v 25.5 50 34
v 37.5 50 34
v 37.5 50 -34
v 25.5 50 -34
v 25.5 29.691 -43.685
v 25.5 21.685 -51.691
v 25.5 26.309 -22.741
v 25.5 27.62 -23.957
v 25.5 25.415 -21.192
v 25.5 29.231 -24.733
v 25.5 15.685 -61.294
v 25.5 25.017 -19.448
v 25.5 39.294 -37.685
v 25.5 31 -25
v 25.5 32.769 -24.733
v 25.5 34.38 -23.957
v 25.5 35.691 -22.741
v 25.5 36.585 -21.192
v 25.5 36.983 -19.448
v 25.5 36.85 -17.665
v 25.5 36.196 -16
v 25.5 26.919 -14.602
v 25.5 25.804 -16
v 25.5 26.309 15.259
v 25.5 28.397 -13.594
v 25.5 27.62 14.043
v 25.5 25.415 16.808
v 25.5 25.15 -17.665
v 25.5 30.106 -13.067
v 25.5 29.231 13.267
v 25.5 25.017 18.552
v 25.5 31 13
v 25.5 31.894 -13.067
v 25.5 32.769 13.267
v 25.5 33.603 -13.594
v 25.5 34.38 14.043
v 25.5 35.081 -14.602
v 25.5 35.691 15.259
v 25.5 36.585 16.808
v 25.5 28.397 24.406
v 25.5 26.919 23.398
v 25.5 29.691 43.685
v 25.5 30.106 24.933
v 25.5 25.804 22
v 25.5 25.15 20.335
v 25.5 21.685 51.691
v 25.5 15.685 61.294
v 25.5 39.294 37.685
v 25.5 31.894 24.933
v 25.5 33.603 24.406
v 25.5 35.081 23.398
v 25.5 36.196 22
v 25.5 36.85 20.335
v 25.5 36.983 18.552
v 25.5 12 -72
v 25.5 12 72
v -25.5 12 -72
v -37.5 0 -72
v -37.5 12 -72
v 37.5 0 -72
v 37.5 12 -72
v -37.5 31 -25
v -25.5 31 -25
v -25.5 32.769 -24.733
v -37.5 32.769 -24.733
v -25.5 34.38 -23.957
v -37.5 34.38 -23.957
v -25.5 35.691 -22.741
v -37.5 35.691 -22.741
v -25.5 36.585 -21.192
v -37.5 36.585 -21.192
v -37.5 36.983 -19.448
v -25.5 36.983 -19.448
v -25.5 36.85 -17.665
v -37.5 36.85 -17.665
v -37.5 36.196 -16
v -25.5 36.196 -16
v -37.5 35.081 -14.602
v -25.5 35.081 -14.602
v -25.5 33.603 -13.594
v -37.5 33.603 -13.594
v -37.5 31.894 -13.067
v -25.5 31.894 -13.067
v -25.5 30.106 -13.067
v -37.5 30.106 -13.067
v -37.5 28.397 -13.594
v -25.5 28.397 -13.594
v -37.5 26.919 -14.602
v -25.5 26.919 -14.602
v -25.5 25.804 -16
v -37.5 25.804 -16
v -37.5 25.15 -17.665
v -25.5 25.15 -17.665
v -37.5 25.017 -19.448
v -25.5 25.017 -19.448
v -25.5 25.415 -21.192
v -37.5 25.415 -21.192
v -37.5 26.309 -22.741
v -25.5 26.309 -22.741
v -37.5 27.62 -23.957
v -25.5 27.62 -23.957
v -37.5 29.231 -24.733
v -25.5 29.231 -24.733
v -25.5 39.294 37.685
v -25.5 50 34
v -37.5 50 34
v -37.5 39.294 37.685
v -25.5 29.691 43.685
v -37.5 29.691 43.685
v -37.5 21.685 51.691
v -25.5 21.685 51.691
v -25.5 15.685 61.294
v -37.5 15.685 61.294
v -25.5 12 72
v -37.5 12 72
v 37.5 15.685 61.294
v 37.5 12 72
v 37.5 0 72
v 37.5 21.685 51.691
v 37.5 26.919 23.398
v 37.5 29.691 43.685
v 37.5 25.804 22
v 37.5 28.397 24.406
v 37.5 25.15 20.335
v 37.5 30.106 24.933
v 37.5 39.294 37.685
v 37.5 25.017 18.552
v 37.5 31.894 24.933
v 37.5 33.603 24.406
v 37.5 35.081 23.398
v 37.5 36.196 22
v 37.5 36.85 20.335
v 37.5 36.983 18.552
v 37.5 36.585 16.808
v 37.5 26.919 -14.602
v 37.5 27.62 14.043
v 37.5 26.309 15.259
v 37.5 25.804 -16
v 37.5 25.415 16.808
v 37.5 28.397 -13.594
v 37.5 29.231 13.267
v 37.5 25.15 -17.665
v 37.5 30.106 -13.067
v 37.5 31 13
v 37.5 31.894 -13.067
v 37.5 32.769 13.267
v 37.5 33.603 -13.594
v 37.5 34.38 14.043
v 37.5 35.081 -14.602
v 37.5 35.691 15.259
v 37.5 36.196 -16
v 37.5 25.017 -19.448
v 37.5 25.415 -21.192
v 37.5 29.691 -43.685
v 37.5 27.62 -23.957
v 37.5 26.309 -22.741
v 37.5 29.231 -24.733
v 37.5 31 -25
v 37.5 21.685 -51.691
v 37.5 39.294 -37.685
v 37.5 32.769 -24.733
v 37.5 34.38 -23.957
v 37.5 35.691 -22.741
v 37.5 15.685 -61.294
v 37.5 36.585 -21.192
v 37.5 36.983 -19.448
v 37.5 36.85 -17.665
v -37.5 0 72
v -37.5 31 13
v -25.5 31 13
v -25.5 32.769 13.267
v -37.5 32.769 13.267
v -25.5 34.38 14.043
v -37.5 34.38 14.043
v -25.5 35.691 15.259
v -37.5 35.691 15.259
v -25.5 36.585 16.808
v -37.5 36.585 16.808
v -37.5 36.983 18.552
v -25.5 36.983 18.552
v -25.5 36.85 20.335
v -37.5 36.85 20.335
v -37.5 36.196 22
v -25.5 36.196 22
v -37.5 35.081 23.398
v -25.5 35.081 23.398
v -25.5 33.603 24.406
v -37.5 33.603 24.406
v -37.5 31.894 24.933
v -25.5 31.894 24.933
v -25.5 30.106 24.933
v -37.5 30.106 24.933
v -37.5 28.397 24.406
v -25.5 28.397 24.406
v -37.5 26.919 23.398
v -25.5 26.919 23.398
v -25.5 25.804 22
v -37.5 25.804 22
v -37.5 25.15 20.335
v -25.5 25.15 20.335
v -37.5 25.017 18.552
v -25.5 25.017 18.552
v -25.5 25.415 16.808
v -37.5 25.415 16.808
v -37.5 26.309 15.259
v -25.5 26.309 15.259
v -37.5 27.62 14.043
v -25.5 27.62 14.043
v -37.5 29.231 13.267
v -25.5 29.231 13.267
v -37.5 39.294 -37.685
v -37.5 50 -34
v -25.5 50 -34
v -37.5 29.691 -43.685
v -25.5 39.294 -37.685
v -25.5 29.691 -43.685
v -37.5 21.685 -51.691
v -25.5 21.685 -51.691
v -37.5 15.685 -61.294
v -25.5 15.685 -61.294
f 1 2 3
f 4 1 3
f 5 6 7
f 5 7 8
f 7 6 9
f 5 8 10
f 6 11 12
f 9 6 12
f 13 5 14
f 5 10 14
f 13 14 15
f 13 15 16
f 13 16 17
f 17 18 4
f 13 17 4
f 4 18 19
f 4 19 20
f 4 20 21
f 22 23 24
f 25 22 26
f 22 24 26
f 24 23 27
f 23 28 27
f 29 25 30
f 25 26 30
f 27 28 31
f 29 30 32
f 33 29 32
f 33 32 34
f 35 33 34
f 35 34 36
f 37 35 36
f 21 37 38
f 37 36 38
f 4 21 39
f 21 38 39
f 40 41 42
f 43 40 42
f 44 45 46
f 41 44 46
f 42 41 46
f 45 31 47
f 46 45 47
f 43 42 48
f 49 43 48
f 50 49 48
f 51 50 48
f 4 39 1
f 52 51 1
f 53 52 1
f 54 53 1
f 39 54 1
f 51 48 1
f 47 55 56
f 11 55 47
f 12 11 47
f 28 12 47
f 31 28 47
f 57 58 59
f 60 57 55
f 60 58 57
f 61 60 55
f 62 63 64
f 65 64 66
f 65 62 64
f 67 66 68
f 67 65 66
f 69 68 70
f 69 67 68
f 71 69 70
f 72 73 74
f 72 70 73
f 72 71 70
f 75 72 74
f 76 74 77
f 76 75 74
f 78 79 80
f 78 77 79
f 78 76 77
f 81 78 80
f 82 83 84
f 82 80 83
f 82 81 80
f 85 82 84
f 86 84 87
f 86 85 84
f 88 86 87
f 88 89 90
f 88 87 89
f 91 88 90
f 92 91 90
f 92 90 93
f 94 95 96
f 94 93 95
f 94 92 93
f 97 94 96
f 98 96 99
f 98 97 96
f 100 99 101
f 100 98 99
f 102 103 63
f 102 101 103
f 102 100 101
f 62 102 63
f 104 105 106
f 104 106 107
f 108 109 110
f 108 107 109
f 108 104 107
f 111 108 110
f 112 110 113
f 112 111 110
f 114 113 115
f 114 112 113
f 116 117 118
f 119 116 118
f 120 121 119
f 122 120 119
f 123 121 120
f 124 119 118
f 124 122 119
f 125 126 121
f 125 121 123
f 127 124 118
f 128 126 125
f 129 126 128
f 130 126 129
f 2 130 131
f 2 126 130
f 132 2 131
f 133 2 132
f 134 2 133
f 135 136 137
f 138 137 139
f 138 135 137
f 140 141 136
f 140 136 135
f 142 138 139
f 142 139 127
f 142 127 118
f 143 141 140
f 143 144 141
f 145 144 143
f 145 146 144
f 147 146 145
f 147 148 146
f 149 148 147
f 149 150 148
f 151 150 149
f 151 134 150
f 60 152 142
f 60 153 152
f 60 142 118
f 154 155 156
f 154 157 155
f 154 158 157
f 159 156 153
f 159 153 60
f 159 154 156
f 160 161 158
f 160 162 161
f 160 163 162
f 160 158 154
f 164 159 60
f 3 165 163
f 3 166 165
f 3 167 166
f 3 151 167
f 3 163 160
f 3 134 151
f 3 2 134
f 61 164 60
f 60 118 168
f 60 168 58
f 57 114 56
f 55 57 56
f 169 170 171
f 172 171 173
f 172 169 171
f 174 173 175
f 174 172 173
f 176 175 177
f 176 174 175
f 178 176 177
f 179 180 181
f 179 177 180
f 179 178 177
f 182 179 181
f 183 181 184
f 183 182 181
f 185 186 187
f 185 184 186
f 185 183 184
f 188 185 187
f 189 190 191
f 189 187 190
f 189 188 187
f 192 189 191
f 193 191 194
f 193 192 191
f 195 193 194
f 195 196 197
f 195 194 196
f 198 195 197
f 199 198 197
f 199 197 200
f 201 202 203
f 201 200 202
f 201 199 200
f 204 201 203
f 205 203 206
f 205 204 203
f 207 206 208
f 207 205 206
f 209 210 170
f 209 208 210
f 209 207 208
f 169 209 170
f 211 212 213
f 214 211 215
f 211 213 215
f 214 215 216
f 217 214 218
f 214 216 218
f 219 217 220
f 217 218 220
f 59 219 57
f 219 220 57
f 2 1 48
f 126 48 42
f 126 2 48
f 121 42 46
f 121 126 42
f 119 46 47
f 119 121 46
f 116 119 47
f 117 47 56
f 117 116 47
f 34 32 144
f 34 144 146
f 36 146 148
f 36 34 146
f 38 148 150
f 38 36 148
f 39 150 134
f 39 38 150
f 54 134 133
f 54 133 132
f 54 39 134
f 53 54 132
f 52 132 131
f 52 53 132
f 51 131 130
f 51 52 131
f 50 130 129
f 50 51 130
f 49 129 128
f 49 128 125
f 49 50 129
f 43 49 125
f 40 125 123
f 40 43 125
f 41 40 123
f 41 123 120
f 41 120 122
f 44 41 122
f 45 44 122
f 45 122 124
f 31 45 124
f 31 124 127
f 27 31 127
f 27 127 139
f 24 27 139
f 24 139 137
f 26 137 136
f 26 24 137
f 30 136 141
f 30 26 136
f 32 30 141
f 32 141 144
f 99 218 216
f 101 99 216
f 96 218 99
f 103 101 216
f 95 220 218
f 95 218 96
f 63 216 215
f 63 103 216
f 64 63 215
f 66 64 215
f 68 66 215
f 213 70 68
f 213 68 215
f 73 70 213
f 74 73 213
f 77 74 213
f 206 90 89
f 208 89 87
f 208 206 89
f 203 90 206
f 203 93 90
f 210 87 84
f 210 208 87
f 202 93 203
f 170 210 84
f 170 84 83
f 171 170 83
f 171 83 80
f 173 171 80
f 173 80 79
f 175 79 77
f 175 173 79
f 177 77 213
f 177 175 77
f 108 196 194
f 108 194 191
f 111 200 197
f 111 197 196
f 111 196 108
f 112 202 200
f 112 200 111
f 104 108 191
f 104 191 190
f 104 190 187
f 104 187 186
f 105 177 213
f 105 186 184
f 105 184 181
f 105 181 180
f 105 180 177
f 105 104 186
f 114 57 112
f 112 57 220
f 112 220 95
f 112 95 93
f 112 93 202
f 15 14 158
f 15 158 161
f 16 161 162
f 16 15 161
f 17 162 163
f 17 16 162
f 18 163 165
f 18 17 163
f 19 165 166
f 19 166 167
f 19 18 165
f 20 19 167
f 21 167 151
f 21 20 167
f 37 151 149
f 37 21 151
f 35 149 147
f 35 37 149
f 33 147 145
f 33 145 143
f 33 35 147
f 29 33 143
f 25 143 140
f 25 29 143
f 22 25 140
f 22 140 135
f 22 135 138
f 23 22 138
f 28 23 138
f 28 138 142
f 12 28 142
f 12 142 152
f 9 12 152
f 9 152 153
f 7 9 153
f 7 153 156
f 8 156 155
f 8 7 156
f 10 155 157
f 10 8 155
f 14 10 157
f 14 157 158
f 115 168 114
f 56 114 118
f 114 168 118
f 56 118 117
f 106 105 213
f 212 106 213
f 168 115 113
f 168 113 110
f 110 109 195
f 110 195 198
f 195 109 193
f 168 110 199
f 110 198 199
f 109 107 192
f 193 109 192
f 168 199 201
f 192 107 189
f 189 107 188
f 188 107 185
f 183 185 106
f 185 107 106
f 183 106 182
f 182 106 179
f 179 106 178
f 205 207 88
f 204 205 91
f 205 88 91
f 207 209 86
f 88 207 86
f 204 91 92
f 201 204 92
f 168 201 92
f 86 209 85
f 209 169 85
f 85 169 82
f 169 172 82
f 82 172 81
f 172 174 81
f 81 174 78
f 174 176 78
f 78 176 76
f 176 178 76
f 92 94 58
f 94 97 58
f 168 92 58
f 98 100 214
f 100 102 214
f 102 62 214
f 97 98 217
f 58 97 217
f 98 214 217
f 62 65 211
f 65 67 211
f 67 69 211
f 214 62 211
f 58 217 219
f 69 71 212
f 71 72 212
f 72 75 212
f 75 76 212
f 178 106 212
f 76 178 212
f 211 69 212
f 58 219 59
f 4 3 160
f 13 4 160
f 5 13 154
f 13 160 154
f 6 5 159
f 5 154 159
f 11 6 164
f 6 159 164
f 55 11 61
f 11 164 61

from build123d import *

# Parameters (mm, degrees)
SKETCH8_W           = 144
SKETCH8_H           = 50
SKETCH8_R           = 6
BOSS_EXTRUDE5_DEPTH = 37.5
SKETCH9_W           = 51
SKETCH9_H           = 38
CUT_EXTRUDE1_DEPTH  = 157.978501713
CUT_EXTRUDE2_DEPTH  = 116.364639296


with BuildPart() as part:
    # Sketch8 → Boss-Extrude5 (new, symmetric)
    with BuildSketch(Plane(origin=(0, 0, 0), x_dir=(0, 0, -1), z_dir=(1, 0, 0))):
        with Locations((0, 25)):
            Rectangle(SKETCH8_W, SKETCH8_H)
        with Locations((-19, 31)):
            Circle(SKETCH8_R, mode=Mode.SUBTRACT)
        with Locations((19, 31)):
            Circle(SKETCH8_R, mode=Mode.SUBTRACT)
    extrude(amount=BOSS_EXTRUDE5_DEPTH, both=True)

    # Sketch9 → Cut-Extrude1 (cut, through all)
    with BuildSketch(Plane.XY.offset(72)):
        with Locations((0, 31)):
            Rectangle(SKETCH9_W, SKETCH9_H)
    extrude(amount=-CUT_EXTRUDE1_DEPTH, mode=Mode.SUBTRACT)

    # Sketch10 → Cut-Extrude2 (cut, through all)
    with BuildSketch(Plane(origin=(37.5, 0, 0), x_dir=(0, 0, -1), z_dir=(1, 0, 0))):
        with BuildLine():
            Line((-72, 50), (-34, 50))
            ThreePointArc((-34, 50), (-47.460763972, 25.460763972), (-72, 12))
            Line((-72, 12), (-72, 50))
        make_face()
        with BuildLine():
            Line((72, 50), (34, 50))
            ThreePointArc((34, 50), (47.460763972, 25.460763972), (72, 12))
            Line((72, 12), (72, 50))
        make_face()
    extrude(amount=-CUT_EXTRUDE2_DEPTH, mode=Mode.SUBTRACT)


solid = part.part
